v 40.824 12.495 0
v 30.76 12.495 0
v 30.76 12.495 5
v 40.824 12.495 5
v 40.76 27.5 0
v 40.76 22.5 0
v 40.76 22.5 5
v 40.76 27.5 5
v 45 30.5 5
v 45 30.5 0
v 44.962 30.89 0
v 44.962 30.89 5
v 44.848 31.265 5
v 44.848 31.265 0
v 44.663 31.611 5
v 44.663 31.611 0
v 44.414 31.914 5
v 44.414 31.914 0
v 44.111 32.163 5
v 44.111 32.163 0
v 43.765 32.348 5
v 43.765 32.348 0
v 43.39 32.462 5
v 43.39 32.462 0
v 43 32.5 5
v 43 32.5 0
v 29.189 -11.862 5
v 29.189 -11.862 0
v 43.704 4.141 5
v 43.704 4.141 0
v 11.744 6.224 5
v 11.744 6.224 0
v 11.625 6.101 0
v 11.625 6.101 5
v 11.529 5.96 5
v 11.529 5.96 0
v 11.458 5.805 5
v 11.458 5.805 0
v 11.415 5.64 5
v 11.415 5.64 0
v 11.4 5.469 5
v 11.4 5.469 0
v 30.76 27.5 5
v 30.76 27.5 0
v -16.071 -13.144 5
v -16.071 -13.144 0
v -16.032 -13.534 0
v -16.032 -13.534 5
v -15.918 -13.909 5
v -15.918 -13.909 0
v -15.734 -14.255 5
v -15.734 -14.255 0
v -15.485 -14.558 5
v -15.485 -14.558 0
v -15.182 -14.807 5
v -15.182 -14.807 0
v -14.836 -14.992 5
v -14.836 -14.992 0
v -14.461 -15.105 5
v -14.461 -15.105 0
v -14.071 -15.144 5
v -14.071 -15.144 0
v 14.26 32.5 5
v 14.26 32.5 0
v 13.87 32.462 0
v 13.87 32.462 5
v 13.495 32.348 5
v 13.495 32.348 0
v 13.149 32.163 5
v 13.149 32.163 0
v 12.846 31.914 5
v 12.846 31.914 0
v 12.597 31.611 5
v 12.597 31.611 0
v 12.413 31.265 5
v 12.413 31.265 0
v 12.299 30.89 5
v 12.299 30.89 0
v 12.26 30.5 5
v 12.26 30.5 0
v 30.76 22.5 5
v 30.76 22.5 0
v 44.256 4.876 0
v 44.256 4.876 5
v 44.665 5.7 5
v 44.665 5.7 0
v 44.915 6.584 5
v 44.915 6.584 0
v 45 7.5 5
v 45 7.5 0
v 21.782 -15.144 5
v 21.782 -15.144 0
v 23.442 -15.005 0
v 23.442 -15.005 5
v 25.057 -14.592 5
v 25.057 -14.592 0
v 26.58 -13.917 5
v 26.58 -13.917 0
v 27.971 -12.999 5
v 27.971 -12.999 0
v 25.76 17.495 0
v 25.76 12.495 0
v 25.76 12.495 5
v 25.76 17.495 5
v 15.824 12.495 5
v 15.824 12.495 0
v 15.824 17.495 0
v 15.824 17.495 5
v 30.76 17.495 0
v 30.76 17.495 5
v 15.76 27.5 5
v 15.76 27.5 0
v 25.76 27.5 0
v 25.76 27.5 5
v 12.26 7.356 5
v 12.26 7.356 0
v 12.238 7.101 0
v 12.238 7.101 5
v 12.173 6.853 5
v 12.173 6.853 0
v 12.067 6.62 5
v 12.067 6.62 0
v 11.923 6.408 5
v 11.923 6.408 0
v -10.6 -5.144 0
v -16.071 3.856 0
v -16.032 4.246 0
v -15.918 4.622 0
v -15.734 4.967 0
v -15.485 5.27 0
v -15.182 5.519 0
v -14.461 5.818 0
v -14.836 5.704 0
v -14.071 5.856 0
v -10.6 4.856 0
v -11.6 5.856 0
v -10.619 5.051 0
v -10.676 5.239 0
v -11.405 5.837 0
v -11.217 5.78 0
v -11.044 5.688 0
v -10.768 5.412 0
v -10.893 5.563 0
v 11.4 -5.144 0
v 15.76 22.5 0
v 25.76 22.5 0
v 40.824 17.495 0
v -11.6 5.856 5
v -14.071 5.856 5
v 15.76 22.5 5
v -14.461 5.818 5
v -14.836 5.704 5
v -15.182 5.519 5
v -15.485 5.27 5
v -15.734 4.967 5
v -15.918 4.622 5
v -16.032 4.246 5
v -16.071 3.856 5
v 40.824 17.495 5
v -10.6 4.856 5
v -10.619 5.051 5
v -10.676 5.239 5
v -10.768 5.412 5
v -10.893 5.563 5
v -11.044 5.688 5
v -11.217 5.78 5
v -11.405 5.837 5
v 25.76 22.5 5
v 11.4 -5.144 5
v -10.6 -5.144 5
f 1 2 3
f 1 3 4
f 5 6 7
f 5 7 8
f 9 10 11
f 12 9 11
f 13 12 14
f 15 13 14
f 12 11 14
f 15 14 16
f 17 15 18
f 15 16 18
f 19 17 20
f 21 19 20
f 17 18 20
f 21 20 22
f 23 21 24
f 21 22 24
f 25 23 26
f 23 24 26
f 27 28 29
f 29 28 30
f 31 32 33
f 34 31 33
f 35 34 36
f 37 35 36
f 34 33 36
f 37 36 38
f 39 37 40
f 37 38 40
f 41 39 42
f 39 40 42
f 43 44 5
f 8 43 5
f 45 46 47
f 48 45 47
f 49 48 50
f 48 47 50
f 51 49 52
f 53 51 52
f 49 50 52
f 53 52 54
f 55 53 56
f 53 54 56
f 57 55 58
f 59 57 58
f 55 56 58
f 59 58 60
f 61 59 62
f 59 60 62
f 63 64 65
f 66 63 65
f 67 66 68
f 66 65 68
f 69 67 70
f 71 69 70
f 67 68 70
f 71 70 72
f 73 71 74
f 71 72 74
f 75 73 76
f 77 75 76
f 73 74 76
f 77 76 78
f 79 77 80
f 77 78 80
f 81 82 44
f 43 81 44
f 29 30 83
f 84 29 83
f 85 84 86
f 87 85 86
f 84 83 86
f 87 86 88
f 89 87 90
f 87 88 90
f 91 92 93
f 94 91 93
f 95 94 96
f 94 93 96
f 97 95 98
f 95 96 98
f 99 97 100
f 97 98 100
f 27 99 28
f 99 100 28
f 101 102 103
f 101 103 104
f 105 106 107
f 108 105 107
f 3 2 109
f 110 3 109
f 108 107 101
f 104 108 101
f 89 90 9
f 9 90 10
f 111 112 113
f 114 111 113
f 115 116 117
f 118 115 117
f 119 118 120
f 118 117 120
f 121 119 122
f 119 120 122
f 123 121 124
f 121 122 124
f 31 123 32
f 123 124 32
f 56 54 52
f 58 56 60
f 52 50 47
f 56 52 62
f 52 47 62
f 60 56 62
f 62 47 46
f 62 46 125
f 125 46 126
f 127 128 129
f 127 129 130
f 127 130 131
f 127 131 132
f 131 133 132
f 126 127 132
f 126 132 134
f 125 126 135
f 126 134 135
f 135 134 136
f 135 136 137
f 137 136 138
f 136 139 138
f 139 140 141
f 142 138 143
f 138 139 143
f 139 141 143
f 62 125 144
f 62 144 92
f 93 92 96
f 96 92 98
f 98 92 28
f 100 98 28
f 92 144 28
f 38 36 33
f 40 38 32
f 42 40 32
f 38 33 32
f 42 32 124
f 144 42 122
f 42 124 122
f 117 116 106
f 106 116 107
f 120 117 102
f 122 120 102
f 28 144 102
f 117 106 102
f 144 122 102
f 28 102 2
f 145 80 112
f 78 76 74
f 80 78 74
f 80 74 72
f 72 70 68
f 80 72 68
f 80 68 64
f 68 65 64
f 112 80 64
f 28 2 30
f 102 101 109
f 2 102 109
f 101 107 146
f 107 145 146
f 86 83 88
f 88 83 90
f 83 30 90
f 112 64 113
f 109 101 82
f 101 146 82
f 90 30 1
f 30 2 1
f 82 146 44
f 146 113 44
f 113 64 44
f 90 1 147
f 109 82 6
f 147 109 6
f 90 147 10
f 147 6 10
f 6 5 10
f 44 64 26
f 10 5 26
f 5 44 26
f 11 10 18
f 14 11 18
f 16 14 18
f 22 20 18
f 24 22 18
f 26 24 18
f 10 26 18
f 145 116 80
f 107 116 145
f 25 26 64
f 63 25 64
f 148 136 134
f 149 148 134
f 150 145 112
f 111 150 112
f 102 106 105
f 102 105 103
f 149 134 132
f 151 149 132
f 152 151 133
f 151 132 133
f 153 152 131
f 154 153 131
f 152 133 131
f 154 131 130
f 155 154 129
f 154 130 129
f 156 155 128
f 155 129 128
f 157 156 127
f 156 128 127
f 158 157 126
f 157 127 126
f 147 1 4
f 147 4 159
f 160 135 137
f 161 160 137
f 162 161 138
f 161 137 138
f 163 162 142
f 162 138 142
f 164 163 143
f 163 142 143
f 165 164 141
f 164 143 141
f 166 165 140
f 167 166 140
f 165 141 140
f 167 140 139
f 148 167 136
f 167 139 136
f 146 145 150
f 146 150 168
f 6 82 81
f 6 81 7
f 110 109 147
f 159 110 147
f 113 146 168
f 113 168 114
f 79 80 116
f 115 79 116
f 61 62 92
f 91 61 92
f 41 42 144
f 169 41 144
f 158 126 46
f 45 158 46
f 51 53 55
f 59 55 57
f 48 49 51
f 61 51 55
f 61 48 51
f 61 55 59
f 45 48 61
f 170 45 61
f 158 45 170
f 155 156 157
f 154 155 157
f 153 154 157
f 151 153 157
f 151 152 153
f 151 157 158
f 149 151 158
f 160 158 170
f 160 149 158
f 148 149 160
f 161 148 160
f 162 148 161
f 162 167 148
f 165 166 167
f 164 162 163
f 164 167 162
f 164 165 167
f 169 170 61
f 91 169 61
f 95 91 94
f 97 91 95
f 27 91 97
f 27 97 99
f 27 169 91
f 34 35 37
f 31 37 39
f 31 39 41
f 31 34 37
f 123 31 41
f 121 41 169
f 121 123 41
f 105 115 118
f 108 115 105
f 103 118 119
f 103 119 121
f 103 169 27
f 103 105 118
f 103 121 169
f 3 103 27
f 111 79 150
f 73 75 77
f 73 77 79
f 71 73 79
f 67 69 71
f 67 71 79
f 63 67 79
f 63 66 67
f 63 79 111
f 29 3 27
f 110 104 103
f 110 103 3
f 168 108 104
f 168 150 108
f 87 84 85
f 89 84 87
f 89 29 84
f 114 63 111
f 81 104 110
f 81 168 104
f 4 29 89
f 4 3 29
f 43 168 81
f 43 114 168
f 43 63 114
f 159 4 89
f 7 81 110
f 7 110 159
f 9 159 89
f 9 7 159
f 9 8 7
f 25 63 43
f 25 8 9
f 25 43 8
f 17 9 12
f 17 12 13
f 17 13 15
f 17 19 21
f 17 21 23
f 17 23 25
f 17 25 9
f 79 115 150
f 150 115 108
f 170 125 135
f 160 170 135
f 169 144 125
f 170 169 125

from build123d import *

# Parameters (mm, degrees)
SKETCH1_W           = 10
SKETCH1_H           = 5
SKETCH1_W_2         = 9.935990319
SKETCH1_W_3         = 10.064009681
BOSS_EXTRUDE1_DEPTH = 5


with BuildPart() as part:
    # Sketch1 → Boss-Extrude1 (new body)
    with BuildSketch(Plane.XY):
        with BuildLine():
            Line((44.999999787, 7.5), (44.999999787, 30.5))
            ThreePointArc((44.999999787, 30.5), (44.41421335, 31.914213562), (42.999999787, 32.5))
            Line((42.999999787, 32.5), (14.260362516, 32.5))
            ThreePointArc((14.260362516, 32.5), (12.846148953, 31.914213562), (12.260362516, 30.5))
            Line((12.260362516, 30.5), (12.260362516, 7.356217509))
            ThreePointArc((12.260362516, 7.356217509), (12.125280096, 6.734124269), (11.744362516, 6.224076175))
            ThreePointArc((11.744362516, 6.224076175), (11.490417462, 5.884044113), (11.400362516, 5.469315286))
            Line((11.400362516, 5.469315286), (11.400362516, -5.143782491))
            Line((11.400362516, -5.143782491), (-10.599637484, -5.143782491))
            Line((-10.599637484, -5.143782491), (-10.599637484, 4.856217509))
            ThreePointArc((-10.599637484, 4.856217509), (-10.892530703, 5.563324291), (-11.599637484, 5.856217509))
            Line((-11.599637484, 5.856217509), (-14.070705683, 5.856217509))
            ThreePointArc((-14.070705683, 5.856217509), (-15.484919246, 5.270431072), (-16.070705683, 3.856217509))
            Line((-16.070705683, 3.856217509), (-16.070705683, -13.143782491))
            ThreePointArc((-16.070705683, -13.143782491), (-15.484919246, -14.557996053), (-14.070705683, -15.143782491))
            Line((-14.070705683, -15.143782491), (21.781895091, -15.143782491))
            ThreePointArc((21.781895091, -15.143782491), (25.832683233, -14.286600187), (29.189018592, -11.862005577))
            Line((29.189018592, -11.862005577), (43.703561538, 4.140888457))
            ThreePointArc((43.703561538, 4.140888457), (44.664643865, 5.699695686), (44.999999787, 7.5))
        make_face()
        with Locations((20.760362516, 25)):
            Rectangle(SKETCH1_W, SKETCH1_H, mode=Mode.SUBTRACT)
        with Locations((20.792367357, 14.995460919)):
            Rectangle(SKETCH1_W_2, SKETCH1_H, mode=Mode.SUBTRACT)
        with Locations((35.760362516, 25)):
            Rectangle(SKETCH1_W, SKETCH1_H, mode=Mode.SUBTRACT)
        with Locations((35.792367357, 14.995460919)):
            Rectangle(SKETCH1_W_3, SKETCH1_H, mode=Mode.SUBTRACT)
    extrude(amount=BOSS_EXTRUDE1_DEPTH)


solid = part.part
